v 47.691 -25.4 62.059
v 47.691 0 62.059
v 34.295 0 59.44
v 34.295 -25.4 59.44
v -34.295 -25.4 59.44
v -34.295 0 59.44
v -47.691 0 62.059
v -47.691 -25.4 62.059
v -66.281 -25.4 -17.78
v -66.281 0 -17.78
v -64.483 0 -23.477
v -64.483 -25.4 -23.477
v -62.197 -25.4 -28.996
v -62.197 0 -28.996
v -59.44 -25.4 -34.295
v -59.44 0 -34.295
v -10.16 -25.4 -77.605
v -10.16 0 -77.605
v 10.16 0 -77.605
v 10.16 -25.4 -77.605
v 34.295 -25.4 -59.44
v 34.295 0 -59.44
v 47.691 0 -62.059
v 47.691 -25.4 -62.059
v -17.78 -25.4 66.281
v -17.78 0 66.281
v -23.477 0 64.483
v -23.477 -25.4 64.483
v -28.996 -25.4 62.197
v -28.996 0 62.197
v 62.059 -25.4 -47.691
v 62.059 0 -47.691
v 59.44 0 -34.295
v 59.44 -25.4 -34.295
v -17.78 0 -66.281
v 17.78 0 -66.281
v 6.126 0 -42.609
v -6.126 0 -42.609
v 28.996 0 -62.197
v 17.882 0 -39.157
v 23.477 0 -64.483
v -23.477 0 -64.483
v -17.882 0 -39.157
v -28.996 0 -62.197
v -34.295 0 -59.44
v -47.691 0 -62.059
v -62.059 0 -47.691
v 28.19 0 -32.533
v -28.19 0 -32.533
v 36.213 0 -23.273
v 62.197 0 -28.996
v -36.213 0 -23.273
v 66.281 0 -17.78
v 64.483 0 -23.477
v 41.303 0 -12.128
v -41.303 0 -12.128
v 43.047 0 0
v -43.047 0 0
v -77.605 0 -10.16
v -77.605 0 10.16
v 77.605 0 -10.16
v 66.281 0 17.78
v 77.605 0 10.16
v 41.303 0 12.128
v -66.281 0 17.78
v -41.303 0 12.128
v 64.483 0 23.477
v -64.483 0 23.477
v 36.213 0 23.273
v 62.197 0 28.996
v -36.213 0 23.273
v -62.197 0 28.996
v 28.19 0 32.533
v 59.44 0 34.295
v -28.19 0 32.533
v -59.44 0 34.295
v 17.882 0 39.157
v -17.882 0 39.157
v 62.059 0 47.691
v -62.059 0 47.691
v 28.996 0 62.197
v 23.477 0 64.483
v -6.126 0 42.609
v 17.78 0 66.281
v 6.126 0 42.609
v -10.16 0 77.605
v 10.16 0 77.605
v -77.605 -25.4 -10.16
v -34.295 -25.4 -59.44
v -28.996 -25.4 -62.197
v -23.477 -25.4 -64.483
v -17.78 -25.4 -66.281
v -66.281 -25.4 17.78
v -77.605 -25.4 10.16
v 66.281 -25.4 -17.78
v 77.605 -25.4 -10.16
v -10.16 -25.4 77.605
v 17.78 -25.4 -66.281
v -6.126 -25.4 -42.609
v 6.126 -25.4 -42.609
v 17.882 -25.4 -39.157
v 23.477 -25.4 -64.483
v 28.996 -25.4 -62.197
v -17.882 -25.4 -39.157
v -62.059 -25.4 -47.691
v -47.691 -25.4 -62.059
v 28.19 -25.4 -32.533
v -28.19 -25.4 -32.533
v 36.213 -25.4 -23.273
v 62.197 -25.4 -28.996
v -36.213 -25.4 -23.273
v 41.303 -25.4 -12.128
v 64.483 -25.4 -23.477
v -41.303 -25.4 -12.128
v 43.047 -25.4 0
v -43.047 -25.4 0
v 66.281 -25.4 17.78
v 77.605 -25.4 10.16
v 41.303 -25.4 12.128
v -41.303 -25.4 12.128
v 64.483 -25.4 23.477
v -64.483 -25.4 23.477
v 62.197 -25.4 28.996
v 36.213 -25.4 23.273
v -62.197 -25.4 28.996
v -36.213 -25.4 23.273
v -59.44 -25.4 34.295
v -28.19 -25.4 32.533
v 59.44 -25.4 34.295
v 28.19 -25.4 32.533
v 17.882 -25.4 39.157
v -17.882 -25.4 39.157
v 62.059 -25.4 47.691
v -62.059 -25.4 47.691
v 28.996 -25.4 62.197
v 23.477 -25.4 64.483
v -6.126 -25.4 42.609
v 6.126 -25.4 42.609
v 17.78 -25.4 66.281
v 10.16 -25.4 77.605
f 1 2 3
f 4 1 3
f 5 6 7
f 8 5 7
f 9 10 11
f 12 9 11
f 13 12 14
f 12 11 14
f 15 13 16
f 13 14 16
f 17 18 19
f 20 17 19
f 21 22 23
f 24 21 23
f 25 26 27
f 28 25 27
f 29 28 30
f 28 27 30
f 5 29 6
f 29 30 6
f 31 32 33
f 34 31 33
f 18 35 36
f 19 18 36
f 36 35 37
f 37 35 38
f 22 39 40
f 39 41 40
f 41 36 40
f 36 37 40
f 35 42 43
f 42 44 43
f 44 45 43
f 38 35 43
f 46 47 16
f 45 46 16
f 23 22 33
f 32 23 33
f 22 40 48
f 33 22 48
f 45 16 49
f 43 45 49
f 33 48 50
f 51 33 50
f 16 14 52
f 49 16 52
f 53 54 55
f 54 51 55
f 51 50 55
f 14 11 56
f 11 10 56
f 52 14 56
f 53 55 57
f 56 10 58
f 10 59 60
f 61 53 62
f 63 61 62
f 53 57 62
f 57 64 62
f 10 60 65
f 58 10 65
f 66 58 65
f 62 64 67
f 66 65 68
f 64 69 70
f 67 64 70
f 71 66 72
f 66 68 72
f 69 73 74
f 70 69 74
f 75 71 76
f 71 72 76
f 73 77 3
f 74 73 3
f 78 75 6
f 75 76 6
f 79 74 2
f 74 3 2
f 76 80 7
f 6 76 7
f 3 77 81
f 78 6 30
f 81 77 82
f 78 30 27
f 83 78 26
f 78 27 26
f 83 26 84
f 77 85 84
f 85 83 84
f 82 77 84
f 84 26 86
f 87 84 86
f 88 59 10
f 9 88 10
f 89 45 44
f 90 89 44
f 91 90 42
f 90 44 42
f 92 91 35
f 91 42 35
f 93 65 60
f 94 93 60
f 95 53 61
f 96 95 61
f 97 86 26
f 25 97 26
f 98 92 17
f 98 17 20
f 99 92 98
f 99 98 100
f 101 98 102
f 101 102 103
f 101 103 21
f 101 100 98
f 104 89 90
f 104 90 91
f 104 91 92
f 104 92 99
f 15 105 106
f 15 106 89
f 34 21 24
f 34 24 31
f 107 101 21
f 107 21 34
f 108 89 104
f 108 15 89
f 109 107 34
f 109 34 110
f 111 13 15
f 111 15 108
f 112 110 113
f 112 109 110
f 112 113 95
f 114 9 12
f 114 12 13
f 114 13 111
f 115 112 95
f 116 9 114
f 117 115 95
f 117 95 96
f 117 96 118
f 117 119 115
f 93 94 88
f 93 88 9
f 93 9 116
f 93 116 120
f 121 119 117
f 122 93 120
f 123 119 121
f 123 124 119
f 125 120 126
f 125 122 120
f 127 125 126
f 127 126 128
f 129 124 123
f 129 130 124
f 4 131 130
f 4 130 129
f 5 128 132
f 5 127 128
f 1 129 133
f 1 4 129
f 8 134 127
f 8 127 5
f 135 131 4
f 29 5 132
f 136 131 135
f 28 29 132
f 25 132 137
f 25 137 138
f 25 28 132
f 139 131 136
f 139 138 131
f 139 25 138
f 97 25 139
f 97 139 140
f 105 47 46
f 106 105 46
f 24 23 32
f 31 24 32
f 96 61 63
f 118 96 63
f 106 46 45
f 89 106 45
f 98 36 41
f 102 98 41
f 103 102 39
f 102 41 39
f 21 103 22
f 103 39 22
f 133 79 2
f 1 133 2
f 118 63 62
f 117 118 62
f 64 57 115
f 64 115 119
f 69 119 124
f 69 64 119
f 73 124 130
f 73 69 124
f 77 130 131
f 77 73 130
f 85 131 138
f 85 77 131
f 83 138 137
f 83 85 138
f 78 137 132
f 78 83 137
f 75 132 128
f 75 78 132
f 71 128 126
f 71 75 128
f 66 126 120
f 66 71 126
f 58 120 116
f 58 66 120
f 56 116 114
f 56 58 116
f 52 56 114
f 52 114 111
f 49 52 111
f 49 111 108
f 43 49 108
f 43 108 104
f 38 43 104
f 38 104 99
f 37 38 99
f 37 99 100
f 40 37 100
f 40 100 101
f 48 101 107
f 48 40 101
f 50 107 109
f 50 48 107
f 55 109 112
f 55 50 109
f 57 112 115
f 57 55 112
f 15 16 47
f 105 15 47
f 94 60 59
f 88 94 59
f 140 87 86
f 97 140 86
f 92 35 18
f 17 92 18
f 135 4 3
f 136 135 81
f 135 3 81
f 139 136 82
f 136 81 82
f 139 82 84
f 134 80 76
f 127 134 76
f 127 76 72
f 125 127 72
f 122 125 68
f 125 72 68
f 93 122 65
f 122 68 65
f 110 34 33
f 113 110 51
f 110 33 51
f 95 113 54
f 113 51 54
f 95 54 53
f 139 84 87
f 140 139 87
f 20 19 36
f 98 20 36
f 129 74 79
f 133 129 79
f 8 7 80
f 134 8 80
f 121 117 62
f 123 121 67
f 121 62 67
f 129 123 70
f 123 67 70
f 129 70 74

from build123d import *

# Parameters (mm, degrees)
F0_R     = 68.6240920578
F0_R_2   = 43.04675532
F1_DEPTH = 25.4
F3_DEPTH = 25.4
F5_COUNT = 8


with BuildPart() as f1:
    # F0 (on Front) → F1 (new body)
    with BuildSketch(Plane.XZ):
        Circle(F0_R)
        Circle(F0_R_2, mode=Mode.SUBTRACT)
    extrude(amount=F1_DEPTH)

    # F2 (on Front) → F3 (join)
    with BuildSketch(Plane.XZ):
        Polygon((10.16, 77.6048756392), (-10.16, 77.6048756392), (-17.78, 66.2807484173), (17.78, 66.2807484173), align=None)
    extrude(amount=F3_DEPTH)

    # F5: F1 ×8 about axis
    f5_axis = Axis((0, -4.3883249164, 0), (0, 1, 0))


with BuildPart() as f1_1:
    add(f1.part)
    for i in range(1, F5_COUNT):
        add(f1.part.rotate(f5_axis, i * 360 / F5_COUNT))


solid = f1_1.part
